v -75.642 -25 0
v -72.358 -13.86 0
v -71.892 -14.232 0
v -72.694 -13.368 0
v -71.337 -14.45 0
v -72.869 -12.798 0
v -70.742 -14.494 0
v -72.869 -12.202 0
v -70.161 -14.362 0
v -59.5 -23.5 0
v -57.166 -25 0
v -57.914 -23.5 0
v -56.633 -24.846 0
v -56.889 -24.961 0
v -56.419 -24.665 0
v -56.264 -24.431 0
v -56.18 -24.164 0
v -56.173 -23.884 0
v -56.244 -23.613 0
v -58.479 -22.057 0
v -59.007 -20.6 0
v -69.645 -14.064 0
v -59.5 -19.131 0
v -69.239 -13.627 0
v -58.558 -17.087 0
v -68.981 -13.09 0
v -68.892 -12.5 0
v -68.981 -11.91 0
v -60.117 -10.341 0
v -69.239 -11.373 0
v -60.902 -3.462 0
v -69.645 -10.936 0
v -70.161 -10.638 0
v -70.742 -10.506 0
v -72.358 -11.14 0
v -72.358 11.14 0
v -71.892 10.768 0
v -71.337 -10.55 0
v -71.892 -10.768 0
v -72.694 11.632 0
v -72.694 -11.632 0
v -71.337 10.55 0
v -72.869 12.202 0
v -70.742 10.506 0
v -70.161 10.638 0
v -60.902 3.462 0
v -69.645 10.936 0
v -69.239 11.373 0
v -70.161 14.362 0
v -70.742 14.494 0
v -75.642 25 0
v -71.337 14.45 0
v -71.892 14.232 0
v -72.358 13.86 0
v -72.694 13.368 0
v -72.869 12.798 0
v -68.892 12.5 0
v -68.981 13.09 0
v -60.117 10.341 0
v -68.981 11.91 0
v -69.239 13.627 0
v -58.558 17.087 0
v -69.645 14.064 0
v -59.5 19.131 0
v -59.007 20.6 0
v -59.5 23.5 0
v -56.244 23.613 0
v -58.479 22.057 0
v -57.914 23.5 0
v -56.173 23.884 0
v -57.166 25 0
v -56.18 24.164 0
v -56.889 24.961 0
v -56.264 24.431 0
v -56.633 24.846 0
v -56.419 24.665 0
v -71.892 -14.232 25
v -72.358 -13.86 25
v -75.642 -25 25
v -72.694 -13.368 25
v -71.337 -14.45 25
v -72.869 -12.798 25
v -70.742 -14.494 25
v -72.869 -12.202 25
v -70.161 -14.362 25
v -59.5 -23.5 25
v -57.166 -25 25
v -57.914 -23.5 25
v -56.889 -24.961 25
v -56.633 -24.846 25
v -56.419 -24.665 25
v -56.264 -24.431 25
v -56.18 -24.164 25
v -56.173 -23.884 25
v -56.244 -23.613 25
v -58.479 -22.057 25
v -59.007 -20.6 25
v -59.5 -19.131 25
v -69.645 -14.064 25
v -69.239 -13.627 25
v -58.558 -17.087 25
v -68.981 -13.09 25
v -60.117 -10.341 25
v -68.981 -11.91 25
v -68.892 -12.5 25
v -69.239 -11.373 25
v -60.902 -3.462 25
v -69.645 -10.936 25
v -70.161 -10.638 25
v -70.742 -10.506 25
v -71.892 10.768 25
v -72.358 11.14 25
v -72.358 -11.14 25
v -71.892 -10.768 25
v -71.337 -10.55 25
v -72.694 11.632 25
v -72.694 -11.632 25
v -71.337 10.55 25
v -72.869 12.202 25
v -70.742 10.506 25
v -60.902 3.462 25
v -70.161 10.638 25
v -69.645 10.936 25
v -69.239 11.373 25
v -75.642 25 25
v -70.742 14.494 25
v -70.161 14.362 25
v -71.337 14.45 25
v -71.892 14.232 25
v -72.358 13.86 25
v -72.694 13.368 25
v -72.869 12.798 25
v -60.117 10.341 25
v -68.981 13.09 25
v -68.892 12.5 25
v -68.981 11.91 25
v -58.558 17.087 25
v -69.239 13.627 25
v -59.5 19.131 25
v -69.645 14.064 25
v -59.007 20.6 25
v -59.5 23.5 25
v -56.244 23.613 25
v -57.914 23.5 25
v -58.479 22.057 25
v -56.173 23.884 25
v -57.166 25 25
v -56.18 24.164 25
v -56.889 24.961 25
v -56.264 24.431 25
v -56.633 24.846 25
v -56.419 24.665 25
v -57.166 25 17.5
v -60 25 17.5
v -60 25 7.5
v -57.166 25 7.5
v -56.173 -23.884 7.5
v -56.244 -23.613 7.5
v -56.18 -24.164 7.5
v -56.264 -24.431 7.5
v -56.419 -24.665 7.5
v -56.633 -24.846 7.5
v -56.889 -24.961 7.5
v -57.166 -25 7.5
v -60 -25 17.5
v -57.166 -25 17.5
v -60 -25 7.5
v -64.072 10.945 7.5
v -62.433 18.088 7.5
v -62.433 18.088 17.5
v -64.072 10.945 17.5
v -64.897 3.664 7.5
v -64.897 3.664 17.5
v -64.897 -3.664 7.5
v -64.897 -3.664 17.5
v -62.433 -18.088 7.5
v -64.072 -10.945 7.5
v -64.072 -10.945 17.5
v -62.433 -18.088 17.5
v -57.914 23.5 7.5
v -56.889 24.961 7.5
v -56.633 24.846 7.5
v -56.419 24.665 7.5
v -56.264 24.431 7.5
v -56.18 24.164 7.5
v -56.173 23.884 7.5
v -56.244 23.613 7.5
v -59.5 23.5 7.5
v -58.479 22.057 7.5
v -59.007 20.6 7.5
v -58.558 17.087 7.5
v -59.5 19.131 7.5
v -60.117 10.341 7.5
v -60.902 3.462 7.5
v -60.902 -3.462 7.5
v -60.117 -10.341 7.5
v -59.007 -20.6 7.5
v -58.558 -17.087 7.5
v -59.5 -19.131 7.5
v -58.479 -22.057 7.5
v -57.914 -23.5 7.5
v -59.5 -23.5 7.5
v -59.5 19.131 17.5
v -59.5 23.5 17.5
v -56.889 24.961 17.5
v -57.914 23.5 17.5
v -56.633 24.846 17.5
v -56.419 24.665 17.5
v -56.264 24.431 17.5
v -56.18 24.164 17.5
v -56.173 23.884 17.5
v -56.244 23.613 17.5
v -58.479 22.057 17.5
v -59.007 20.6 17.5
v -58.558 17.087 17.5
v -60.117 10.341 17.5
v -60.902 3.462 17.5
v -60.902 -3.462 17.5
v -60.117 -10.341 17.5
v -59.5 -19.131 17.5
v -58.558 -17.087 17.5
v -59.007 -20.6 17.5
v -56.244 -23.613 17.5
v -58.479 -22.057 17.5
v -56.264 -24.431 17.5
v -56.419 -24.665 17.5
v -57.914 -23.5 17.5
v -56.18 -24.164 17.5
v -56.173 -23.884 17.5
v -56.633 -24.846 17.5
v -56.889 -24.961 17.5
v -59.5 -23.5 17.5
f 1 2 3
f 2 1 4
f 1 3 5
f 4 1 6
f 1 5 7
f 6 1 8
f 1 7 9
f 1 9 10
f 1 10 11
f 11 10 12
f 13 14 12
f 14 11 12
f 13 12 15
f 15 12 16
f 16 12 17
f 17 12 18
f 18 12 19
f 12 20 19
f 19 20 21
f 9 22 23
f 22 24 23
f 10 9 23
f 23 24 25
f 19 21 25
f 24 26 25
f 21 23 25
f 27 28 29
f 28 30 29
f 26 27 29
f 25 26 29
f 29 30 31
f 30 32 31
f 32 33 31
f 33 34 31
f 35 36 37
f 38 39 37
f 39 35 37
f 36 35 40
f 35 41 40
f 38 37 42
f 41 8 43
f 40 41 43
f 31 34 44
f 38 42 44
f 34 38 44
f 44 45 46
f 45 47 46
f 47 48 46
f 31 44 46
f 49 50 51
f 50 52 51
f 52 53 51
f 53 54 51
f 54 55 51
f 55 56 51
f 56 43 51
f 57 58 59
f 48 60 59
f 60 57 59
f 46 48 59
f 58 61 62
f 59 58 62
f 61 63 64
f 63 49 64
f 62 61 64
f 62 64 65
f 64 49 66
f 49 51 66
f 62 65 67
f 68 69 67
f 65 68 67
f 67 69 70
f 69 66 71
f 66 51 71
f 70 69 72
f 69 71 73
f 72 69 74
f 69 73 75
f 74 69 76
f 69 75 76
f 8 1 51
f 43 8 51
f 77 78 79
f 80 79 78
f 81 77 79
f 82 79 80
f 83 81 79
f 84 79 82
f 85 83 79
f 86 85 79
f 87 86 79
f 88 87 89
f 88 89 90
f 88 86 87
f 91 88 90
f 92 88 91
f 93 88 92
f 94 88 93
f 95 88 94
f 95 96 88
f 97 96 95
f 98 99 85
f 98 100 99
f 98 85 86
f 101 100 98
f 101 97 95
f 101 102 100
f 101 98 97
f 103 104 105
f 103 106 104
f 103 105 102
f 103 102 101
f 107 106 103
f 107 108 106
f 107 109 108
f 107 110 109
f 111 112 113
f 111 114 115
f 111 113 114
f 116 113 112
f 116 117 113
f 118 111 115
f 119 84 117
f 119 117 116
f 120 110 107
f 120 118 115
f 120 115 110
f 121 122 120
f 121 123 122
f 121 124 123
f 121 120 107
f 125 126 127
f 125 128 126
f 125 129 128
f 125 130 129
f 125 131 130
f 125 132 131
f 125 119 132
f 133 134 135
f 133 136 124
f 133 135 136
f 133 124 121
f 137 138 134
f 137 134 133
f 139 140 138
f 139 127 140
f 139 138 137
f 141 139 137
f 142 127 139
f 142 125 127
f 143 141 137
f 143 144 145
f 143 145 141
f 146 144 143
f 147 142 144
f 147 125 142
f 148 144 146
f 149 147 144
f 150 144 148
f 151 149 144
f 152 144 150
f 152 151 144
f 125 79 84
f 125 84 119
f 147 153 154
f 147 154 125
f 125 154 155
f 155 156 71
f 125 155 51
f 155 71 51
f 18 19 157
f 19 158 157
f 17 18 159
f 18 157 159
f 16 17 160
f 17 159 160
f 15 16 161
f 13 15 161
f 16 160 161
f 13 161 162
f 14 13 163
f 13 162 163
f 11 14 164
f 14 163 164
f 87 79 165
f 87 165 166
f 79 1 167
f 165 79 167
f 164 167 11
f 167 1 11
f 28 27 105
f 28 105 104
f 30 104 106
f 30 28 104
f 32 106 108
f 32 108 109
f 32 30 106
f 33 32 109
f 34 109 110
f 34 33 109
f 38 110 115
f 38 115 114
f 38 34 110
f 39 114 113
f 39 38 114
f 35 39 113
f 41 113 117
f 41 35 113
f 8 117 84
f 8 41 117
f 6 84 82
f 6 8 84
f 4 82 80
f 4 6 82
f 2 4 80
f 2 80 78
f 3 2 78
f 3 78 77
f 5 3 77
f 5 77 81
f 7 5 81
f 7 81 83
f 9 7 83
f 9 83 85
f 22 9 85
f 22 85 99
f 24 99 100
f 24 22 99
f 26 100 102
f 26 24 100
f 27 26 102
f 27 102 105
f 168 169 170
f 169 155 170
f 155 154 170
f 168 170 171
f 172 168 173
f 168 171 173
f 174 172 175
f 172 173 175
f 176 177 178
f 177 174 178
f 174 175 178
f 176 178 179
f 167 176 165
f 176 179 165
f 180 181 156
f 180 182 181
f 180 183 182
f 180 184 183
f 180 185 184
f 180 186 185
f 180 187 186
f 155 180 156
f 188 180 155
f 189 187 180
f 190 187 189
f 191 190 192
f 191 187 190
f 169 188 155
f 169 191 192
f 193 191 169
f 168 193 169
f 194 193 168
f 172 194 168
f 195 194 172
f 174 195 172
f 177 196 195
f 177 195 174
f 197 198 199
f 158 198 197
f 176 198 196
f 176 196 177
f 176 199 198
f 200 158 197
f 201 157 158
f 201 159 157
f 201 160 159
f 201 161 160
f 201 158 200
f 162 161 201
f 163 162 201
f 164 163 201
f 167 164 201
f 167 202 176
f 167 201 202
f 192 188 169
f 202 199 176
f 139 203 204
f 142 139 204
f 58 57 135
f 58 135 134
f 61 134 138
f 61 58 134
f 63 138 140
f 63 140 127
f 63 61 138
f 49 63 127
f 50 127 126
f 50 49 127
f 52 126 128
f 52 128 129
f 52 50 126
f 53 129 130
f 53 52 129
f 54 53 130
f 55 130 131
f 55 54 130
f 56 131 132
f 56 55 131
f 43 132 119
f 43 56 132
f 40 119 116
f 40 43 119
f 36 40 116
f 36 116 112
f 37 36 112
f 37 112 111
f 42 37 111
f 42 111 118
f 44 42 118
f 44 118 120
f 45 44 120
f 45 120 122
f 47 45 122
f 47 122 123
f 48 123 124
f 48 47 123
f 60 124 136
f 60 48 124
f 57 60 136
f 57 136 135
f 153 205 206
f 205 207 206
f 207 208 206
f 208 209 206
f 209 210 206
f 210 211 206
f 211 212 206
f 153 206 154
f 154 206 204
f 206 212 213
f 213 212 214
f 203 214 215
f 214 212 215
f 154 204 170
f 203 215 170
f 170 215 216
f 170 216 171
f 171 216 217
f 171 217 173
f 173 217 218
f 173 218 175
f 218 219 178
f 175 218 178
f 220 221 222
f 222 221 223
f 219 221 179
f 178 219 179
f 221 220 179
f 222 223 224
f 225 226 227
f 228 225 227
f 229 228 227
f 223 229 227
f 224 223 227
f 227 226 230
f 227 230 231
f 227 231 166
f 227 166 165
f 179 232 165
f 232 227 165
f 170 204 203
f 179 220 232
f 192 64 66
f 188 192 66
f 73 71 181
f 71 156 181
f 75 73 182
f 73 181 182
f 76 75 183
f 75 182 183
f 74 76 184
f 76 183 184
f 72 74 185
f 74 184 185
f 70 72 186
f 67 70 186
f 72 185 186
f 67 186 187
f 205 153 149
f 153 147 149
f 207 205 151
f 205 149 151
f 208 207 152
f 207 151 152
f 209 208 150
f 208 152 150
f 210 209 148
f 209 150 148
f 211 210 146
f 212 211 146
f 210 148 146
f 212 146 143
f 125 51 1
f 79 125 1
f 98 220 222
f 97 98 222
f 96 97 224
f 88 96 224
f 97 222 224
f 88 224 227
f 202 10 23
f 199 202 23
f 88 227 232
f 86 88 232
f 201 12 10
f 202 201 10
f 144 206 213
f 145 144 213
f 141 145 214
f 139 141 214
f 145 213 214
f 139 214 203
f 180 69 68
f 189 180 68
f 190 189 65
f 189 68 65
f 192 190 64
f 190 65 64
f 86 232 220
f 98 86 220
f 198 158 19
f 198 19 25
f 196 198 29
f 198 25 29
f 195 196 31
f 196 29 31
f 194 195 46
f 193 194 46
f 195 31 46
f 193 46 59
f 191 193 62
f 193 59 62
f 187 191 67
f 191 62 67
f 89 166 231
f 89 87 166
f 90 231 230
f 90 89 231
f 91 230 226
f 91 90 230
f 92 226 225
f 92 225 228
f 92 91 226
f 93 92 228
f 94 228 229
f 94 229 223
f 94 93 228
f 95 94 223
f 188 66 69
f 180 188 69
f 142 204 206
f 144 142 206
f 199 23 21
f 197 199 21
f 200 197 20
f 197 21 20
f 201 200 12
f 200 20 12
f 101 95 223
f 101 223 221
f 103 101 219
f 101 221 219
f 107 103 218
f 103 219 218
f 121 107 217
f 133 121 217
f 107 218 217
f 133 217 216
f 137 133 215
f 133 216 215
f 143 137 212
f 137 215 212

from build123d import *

# Parameters (mm, degrees)
F0_W     = 14.641710973
F0_H     = 25
F0_R     = 2
F2_DEPTH = 25
F1_W     = 8
F1_H     = 10
F4_R     = 1


# Not quite as in the source:
# - a feature names something its author has since deleted; it is built from what else it names


with BuildPart() as f2:
    # F0 (on Top) → F2 (new body)
    with BuildSketch(Plane.XY):
        with BuildLine():
            ThreePointArc((-61, 0), (-59.6453869522, 12.7838888967), (-55.641710973, 25))
            Line((-55.641710973, 25), (-61, 25))
            Line((-61, 25), (-61, 0))
        make_face()
        with BuildLine():
            Line((-59.5, 19.1311264697), (-59.5, 23.5))
            Line((-59.5, 23.5), (-57.9137289423, 23.5))
            ThreePointArc((-57.9137289423, 23.5), (-58.7474910104, 21.3303141089), (-59.5, 19.1311264697))
        make_face(mode=Mode.SUBTRACT)
        with BuildLine():
            ThreePointArc((-55.641710973, -25), (-59.6453869522, -12.7838888967), (-61, 0))
            Line((-61, 0), (-61, -25))
            Line((-61, -25), (-55.641710973, -25))
        make_face()
        with BuildLine():
            Line((-57.9137289423, -23.5), (-59.5, -23.5))
            Line((-59.5, -23.5), (-59.5, -19.1311264697))
            ThreePointArc((-59.5, -19.1311264697), (-58.7474910104, -21.3303141089), (-57.9137289423, -23.5))
        make_face(mode=Mode.SUBTRACT)
        with Locations((-68.3208554865, -12.5)):
            Rectangle(F0_W, F0_H)
        with Locations((-70.891710973, -12.5)):
            Circle(F0_R, mode=Mode.SUBTRACT)
        with Locations((-68.3208554865, 12.5)):
            Rectangle(F0_W, F0_H)
        with Locations((-70.891710973, 12.5)):
            Circle(F0_R, mode=Mode.SUBTRACT)
    extrude(amount=F2_DEPTH)

    # F1 (on Front) → F3 (revolve, cut)
    with BuildSketch(Plane.XZ):
        with Locations((-61, 12.5)):
            Rectangle(F1_W, F1_H)
    revolve(axis=Axis((0, 0, 15.2043728158), (0, 0, 1)), mode=Mode.SUBTRACT)

    # F4
    f4_edges = [f2.edges().sort_by_distance(p)[0] for p in [
        (-55.641711, 25, 21.25),
        (-55.641711, 25, 3.75),
        (-55.641711, -25, 3.75),
        (-55.641711, -25, 21.25),
    ]]
    fillet(f4_edges, radius=F4_R)


solid = f2.part
